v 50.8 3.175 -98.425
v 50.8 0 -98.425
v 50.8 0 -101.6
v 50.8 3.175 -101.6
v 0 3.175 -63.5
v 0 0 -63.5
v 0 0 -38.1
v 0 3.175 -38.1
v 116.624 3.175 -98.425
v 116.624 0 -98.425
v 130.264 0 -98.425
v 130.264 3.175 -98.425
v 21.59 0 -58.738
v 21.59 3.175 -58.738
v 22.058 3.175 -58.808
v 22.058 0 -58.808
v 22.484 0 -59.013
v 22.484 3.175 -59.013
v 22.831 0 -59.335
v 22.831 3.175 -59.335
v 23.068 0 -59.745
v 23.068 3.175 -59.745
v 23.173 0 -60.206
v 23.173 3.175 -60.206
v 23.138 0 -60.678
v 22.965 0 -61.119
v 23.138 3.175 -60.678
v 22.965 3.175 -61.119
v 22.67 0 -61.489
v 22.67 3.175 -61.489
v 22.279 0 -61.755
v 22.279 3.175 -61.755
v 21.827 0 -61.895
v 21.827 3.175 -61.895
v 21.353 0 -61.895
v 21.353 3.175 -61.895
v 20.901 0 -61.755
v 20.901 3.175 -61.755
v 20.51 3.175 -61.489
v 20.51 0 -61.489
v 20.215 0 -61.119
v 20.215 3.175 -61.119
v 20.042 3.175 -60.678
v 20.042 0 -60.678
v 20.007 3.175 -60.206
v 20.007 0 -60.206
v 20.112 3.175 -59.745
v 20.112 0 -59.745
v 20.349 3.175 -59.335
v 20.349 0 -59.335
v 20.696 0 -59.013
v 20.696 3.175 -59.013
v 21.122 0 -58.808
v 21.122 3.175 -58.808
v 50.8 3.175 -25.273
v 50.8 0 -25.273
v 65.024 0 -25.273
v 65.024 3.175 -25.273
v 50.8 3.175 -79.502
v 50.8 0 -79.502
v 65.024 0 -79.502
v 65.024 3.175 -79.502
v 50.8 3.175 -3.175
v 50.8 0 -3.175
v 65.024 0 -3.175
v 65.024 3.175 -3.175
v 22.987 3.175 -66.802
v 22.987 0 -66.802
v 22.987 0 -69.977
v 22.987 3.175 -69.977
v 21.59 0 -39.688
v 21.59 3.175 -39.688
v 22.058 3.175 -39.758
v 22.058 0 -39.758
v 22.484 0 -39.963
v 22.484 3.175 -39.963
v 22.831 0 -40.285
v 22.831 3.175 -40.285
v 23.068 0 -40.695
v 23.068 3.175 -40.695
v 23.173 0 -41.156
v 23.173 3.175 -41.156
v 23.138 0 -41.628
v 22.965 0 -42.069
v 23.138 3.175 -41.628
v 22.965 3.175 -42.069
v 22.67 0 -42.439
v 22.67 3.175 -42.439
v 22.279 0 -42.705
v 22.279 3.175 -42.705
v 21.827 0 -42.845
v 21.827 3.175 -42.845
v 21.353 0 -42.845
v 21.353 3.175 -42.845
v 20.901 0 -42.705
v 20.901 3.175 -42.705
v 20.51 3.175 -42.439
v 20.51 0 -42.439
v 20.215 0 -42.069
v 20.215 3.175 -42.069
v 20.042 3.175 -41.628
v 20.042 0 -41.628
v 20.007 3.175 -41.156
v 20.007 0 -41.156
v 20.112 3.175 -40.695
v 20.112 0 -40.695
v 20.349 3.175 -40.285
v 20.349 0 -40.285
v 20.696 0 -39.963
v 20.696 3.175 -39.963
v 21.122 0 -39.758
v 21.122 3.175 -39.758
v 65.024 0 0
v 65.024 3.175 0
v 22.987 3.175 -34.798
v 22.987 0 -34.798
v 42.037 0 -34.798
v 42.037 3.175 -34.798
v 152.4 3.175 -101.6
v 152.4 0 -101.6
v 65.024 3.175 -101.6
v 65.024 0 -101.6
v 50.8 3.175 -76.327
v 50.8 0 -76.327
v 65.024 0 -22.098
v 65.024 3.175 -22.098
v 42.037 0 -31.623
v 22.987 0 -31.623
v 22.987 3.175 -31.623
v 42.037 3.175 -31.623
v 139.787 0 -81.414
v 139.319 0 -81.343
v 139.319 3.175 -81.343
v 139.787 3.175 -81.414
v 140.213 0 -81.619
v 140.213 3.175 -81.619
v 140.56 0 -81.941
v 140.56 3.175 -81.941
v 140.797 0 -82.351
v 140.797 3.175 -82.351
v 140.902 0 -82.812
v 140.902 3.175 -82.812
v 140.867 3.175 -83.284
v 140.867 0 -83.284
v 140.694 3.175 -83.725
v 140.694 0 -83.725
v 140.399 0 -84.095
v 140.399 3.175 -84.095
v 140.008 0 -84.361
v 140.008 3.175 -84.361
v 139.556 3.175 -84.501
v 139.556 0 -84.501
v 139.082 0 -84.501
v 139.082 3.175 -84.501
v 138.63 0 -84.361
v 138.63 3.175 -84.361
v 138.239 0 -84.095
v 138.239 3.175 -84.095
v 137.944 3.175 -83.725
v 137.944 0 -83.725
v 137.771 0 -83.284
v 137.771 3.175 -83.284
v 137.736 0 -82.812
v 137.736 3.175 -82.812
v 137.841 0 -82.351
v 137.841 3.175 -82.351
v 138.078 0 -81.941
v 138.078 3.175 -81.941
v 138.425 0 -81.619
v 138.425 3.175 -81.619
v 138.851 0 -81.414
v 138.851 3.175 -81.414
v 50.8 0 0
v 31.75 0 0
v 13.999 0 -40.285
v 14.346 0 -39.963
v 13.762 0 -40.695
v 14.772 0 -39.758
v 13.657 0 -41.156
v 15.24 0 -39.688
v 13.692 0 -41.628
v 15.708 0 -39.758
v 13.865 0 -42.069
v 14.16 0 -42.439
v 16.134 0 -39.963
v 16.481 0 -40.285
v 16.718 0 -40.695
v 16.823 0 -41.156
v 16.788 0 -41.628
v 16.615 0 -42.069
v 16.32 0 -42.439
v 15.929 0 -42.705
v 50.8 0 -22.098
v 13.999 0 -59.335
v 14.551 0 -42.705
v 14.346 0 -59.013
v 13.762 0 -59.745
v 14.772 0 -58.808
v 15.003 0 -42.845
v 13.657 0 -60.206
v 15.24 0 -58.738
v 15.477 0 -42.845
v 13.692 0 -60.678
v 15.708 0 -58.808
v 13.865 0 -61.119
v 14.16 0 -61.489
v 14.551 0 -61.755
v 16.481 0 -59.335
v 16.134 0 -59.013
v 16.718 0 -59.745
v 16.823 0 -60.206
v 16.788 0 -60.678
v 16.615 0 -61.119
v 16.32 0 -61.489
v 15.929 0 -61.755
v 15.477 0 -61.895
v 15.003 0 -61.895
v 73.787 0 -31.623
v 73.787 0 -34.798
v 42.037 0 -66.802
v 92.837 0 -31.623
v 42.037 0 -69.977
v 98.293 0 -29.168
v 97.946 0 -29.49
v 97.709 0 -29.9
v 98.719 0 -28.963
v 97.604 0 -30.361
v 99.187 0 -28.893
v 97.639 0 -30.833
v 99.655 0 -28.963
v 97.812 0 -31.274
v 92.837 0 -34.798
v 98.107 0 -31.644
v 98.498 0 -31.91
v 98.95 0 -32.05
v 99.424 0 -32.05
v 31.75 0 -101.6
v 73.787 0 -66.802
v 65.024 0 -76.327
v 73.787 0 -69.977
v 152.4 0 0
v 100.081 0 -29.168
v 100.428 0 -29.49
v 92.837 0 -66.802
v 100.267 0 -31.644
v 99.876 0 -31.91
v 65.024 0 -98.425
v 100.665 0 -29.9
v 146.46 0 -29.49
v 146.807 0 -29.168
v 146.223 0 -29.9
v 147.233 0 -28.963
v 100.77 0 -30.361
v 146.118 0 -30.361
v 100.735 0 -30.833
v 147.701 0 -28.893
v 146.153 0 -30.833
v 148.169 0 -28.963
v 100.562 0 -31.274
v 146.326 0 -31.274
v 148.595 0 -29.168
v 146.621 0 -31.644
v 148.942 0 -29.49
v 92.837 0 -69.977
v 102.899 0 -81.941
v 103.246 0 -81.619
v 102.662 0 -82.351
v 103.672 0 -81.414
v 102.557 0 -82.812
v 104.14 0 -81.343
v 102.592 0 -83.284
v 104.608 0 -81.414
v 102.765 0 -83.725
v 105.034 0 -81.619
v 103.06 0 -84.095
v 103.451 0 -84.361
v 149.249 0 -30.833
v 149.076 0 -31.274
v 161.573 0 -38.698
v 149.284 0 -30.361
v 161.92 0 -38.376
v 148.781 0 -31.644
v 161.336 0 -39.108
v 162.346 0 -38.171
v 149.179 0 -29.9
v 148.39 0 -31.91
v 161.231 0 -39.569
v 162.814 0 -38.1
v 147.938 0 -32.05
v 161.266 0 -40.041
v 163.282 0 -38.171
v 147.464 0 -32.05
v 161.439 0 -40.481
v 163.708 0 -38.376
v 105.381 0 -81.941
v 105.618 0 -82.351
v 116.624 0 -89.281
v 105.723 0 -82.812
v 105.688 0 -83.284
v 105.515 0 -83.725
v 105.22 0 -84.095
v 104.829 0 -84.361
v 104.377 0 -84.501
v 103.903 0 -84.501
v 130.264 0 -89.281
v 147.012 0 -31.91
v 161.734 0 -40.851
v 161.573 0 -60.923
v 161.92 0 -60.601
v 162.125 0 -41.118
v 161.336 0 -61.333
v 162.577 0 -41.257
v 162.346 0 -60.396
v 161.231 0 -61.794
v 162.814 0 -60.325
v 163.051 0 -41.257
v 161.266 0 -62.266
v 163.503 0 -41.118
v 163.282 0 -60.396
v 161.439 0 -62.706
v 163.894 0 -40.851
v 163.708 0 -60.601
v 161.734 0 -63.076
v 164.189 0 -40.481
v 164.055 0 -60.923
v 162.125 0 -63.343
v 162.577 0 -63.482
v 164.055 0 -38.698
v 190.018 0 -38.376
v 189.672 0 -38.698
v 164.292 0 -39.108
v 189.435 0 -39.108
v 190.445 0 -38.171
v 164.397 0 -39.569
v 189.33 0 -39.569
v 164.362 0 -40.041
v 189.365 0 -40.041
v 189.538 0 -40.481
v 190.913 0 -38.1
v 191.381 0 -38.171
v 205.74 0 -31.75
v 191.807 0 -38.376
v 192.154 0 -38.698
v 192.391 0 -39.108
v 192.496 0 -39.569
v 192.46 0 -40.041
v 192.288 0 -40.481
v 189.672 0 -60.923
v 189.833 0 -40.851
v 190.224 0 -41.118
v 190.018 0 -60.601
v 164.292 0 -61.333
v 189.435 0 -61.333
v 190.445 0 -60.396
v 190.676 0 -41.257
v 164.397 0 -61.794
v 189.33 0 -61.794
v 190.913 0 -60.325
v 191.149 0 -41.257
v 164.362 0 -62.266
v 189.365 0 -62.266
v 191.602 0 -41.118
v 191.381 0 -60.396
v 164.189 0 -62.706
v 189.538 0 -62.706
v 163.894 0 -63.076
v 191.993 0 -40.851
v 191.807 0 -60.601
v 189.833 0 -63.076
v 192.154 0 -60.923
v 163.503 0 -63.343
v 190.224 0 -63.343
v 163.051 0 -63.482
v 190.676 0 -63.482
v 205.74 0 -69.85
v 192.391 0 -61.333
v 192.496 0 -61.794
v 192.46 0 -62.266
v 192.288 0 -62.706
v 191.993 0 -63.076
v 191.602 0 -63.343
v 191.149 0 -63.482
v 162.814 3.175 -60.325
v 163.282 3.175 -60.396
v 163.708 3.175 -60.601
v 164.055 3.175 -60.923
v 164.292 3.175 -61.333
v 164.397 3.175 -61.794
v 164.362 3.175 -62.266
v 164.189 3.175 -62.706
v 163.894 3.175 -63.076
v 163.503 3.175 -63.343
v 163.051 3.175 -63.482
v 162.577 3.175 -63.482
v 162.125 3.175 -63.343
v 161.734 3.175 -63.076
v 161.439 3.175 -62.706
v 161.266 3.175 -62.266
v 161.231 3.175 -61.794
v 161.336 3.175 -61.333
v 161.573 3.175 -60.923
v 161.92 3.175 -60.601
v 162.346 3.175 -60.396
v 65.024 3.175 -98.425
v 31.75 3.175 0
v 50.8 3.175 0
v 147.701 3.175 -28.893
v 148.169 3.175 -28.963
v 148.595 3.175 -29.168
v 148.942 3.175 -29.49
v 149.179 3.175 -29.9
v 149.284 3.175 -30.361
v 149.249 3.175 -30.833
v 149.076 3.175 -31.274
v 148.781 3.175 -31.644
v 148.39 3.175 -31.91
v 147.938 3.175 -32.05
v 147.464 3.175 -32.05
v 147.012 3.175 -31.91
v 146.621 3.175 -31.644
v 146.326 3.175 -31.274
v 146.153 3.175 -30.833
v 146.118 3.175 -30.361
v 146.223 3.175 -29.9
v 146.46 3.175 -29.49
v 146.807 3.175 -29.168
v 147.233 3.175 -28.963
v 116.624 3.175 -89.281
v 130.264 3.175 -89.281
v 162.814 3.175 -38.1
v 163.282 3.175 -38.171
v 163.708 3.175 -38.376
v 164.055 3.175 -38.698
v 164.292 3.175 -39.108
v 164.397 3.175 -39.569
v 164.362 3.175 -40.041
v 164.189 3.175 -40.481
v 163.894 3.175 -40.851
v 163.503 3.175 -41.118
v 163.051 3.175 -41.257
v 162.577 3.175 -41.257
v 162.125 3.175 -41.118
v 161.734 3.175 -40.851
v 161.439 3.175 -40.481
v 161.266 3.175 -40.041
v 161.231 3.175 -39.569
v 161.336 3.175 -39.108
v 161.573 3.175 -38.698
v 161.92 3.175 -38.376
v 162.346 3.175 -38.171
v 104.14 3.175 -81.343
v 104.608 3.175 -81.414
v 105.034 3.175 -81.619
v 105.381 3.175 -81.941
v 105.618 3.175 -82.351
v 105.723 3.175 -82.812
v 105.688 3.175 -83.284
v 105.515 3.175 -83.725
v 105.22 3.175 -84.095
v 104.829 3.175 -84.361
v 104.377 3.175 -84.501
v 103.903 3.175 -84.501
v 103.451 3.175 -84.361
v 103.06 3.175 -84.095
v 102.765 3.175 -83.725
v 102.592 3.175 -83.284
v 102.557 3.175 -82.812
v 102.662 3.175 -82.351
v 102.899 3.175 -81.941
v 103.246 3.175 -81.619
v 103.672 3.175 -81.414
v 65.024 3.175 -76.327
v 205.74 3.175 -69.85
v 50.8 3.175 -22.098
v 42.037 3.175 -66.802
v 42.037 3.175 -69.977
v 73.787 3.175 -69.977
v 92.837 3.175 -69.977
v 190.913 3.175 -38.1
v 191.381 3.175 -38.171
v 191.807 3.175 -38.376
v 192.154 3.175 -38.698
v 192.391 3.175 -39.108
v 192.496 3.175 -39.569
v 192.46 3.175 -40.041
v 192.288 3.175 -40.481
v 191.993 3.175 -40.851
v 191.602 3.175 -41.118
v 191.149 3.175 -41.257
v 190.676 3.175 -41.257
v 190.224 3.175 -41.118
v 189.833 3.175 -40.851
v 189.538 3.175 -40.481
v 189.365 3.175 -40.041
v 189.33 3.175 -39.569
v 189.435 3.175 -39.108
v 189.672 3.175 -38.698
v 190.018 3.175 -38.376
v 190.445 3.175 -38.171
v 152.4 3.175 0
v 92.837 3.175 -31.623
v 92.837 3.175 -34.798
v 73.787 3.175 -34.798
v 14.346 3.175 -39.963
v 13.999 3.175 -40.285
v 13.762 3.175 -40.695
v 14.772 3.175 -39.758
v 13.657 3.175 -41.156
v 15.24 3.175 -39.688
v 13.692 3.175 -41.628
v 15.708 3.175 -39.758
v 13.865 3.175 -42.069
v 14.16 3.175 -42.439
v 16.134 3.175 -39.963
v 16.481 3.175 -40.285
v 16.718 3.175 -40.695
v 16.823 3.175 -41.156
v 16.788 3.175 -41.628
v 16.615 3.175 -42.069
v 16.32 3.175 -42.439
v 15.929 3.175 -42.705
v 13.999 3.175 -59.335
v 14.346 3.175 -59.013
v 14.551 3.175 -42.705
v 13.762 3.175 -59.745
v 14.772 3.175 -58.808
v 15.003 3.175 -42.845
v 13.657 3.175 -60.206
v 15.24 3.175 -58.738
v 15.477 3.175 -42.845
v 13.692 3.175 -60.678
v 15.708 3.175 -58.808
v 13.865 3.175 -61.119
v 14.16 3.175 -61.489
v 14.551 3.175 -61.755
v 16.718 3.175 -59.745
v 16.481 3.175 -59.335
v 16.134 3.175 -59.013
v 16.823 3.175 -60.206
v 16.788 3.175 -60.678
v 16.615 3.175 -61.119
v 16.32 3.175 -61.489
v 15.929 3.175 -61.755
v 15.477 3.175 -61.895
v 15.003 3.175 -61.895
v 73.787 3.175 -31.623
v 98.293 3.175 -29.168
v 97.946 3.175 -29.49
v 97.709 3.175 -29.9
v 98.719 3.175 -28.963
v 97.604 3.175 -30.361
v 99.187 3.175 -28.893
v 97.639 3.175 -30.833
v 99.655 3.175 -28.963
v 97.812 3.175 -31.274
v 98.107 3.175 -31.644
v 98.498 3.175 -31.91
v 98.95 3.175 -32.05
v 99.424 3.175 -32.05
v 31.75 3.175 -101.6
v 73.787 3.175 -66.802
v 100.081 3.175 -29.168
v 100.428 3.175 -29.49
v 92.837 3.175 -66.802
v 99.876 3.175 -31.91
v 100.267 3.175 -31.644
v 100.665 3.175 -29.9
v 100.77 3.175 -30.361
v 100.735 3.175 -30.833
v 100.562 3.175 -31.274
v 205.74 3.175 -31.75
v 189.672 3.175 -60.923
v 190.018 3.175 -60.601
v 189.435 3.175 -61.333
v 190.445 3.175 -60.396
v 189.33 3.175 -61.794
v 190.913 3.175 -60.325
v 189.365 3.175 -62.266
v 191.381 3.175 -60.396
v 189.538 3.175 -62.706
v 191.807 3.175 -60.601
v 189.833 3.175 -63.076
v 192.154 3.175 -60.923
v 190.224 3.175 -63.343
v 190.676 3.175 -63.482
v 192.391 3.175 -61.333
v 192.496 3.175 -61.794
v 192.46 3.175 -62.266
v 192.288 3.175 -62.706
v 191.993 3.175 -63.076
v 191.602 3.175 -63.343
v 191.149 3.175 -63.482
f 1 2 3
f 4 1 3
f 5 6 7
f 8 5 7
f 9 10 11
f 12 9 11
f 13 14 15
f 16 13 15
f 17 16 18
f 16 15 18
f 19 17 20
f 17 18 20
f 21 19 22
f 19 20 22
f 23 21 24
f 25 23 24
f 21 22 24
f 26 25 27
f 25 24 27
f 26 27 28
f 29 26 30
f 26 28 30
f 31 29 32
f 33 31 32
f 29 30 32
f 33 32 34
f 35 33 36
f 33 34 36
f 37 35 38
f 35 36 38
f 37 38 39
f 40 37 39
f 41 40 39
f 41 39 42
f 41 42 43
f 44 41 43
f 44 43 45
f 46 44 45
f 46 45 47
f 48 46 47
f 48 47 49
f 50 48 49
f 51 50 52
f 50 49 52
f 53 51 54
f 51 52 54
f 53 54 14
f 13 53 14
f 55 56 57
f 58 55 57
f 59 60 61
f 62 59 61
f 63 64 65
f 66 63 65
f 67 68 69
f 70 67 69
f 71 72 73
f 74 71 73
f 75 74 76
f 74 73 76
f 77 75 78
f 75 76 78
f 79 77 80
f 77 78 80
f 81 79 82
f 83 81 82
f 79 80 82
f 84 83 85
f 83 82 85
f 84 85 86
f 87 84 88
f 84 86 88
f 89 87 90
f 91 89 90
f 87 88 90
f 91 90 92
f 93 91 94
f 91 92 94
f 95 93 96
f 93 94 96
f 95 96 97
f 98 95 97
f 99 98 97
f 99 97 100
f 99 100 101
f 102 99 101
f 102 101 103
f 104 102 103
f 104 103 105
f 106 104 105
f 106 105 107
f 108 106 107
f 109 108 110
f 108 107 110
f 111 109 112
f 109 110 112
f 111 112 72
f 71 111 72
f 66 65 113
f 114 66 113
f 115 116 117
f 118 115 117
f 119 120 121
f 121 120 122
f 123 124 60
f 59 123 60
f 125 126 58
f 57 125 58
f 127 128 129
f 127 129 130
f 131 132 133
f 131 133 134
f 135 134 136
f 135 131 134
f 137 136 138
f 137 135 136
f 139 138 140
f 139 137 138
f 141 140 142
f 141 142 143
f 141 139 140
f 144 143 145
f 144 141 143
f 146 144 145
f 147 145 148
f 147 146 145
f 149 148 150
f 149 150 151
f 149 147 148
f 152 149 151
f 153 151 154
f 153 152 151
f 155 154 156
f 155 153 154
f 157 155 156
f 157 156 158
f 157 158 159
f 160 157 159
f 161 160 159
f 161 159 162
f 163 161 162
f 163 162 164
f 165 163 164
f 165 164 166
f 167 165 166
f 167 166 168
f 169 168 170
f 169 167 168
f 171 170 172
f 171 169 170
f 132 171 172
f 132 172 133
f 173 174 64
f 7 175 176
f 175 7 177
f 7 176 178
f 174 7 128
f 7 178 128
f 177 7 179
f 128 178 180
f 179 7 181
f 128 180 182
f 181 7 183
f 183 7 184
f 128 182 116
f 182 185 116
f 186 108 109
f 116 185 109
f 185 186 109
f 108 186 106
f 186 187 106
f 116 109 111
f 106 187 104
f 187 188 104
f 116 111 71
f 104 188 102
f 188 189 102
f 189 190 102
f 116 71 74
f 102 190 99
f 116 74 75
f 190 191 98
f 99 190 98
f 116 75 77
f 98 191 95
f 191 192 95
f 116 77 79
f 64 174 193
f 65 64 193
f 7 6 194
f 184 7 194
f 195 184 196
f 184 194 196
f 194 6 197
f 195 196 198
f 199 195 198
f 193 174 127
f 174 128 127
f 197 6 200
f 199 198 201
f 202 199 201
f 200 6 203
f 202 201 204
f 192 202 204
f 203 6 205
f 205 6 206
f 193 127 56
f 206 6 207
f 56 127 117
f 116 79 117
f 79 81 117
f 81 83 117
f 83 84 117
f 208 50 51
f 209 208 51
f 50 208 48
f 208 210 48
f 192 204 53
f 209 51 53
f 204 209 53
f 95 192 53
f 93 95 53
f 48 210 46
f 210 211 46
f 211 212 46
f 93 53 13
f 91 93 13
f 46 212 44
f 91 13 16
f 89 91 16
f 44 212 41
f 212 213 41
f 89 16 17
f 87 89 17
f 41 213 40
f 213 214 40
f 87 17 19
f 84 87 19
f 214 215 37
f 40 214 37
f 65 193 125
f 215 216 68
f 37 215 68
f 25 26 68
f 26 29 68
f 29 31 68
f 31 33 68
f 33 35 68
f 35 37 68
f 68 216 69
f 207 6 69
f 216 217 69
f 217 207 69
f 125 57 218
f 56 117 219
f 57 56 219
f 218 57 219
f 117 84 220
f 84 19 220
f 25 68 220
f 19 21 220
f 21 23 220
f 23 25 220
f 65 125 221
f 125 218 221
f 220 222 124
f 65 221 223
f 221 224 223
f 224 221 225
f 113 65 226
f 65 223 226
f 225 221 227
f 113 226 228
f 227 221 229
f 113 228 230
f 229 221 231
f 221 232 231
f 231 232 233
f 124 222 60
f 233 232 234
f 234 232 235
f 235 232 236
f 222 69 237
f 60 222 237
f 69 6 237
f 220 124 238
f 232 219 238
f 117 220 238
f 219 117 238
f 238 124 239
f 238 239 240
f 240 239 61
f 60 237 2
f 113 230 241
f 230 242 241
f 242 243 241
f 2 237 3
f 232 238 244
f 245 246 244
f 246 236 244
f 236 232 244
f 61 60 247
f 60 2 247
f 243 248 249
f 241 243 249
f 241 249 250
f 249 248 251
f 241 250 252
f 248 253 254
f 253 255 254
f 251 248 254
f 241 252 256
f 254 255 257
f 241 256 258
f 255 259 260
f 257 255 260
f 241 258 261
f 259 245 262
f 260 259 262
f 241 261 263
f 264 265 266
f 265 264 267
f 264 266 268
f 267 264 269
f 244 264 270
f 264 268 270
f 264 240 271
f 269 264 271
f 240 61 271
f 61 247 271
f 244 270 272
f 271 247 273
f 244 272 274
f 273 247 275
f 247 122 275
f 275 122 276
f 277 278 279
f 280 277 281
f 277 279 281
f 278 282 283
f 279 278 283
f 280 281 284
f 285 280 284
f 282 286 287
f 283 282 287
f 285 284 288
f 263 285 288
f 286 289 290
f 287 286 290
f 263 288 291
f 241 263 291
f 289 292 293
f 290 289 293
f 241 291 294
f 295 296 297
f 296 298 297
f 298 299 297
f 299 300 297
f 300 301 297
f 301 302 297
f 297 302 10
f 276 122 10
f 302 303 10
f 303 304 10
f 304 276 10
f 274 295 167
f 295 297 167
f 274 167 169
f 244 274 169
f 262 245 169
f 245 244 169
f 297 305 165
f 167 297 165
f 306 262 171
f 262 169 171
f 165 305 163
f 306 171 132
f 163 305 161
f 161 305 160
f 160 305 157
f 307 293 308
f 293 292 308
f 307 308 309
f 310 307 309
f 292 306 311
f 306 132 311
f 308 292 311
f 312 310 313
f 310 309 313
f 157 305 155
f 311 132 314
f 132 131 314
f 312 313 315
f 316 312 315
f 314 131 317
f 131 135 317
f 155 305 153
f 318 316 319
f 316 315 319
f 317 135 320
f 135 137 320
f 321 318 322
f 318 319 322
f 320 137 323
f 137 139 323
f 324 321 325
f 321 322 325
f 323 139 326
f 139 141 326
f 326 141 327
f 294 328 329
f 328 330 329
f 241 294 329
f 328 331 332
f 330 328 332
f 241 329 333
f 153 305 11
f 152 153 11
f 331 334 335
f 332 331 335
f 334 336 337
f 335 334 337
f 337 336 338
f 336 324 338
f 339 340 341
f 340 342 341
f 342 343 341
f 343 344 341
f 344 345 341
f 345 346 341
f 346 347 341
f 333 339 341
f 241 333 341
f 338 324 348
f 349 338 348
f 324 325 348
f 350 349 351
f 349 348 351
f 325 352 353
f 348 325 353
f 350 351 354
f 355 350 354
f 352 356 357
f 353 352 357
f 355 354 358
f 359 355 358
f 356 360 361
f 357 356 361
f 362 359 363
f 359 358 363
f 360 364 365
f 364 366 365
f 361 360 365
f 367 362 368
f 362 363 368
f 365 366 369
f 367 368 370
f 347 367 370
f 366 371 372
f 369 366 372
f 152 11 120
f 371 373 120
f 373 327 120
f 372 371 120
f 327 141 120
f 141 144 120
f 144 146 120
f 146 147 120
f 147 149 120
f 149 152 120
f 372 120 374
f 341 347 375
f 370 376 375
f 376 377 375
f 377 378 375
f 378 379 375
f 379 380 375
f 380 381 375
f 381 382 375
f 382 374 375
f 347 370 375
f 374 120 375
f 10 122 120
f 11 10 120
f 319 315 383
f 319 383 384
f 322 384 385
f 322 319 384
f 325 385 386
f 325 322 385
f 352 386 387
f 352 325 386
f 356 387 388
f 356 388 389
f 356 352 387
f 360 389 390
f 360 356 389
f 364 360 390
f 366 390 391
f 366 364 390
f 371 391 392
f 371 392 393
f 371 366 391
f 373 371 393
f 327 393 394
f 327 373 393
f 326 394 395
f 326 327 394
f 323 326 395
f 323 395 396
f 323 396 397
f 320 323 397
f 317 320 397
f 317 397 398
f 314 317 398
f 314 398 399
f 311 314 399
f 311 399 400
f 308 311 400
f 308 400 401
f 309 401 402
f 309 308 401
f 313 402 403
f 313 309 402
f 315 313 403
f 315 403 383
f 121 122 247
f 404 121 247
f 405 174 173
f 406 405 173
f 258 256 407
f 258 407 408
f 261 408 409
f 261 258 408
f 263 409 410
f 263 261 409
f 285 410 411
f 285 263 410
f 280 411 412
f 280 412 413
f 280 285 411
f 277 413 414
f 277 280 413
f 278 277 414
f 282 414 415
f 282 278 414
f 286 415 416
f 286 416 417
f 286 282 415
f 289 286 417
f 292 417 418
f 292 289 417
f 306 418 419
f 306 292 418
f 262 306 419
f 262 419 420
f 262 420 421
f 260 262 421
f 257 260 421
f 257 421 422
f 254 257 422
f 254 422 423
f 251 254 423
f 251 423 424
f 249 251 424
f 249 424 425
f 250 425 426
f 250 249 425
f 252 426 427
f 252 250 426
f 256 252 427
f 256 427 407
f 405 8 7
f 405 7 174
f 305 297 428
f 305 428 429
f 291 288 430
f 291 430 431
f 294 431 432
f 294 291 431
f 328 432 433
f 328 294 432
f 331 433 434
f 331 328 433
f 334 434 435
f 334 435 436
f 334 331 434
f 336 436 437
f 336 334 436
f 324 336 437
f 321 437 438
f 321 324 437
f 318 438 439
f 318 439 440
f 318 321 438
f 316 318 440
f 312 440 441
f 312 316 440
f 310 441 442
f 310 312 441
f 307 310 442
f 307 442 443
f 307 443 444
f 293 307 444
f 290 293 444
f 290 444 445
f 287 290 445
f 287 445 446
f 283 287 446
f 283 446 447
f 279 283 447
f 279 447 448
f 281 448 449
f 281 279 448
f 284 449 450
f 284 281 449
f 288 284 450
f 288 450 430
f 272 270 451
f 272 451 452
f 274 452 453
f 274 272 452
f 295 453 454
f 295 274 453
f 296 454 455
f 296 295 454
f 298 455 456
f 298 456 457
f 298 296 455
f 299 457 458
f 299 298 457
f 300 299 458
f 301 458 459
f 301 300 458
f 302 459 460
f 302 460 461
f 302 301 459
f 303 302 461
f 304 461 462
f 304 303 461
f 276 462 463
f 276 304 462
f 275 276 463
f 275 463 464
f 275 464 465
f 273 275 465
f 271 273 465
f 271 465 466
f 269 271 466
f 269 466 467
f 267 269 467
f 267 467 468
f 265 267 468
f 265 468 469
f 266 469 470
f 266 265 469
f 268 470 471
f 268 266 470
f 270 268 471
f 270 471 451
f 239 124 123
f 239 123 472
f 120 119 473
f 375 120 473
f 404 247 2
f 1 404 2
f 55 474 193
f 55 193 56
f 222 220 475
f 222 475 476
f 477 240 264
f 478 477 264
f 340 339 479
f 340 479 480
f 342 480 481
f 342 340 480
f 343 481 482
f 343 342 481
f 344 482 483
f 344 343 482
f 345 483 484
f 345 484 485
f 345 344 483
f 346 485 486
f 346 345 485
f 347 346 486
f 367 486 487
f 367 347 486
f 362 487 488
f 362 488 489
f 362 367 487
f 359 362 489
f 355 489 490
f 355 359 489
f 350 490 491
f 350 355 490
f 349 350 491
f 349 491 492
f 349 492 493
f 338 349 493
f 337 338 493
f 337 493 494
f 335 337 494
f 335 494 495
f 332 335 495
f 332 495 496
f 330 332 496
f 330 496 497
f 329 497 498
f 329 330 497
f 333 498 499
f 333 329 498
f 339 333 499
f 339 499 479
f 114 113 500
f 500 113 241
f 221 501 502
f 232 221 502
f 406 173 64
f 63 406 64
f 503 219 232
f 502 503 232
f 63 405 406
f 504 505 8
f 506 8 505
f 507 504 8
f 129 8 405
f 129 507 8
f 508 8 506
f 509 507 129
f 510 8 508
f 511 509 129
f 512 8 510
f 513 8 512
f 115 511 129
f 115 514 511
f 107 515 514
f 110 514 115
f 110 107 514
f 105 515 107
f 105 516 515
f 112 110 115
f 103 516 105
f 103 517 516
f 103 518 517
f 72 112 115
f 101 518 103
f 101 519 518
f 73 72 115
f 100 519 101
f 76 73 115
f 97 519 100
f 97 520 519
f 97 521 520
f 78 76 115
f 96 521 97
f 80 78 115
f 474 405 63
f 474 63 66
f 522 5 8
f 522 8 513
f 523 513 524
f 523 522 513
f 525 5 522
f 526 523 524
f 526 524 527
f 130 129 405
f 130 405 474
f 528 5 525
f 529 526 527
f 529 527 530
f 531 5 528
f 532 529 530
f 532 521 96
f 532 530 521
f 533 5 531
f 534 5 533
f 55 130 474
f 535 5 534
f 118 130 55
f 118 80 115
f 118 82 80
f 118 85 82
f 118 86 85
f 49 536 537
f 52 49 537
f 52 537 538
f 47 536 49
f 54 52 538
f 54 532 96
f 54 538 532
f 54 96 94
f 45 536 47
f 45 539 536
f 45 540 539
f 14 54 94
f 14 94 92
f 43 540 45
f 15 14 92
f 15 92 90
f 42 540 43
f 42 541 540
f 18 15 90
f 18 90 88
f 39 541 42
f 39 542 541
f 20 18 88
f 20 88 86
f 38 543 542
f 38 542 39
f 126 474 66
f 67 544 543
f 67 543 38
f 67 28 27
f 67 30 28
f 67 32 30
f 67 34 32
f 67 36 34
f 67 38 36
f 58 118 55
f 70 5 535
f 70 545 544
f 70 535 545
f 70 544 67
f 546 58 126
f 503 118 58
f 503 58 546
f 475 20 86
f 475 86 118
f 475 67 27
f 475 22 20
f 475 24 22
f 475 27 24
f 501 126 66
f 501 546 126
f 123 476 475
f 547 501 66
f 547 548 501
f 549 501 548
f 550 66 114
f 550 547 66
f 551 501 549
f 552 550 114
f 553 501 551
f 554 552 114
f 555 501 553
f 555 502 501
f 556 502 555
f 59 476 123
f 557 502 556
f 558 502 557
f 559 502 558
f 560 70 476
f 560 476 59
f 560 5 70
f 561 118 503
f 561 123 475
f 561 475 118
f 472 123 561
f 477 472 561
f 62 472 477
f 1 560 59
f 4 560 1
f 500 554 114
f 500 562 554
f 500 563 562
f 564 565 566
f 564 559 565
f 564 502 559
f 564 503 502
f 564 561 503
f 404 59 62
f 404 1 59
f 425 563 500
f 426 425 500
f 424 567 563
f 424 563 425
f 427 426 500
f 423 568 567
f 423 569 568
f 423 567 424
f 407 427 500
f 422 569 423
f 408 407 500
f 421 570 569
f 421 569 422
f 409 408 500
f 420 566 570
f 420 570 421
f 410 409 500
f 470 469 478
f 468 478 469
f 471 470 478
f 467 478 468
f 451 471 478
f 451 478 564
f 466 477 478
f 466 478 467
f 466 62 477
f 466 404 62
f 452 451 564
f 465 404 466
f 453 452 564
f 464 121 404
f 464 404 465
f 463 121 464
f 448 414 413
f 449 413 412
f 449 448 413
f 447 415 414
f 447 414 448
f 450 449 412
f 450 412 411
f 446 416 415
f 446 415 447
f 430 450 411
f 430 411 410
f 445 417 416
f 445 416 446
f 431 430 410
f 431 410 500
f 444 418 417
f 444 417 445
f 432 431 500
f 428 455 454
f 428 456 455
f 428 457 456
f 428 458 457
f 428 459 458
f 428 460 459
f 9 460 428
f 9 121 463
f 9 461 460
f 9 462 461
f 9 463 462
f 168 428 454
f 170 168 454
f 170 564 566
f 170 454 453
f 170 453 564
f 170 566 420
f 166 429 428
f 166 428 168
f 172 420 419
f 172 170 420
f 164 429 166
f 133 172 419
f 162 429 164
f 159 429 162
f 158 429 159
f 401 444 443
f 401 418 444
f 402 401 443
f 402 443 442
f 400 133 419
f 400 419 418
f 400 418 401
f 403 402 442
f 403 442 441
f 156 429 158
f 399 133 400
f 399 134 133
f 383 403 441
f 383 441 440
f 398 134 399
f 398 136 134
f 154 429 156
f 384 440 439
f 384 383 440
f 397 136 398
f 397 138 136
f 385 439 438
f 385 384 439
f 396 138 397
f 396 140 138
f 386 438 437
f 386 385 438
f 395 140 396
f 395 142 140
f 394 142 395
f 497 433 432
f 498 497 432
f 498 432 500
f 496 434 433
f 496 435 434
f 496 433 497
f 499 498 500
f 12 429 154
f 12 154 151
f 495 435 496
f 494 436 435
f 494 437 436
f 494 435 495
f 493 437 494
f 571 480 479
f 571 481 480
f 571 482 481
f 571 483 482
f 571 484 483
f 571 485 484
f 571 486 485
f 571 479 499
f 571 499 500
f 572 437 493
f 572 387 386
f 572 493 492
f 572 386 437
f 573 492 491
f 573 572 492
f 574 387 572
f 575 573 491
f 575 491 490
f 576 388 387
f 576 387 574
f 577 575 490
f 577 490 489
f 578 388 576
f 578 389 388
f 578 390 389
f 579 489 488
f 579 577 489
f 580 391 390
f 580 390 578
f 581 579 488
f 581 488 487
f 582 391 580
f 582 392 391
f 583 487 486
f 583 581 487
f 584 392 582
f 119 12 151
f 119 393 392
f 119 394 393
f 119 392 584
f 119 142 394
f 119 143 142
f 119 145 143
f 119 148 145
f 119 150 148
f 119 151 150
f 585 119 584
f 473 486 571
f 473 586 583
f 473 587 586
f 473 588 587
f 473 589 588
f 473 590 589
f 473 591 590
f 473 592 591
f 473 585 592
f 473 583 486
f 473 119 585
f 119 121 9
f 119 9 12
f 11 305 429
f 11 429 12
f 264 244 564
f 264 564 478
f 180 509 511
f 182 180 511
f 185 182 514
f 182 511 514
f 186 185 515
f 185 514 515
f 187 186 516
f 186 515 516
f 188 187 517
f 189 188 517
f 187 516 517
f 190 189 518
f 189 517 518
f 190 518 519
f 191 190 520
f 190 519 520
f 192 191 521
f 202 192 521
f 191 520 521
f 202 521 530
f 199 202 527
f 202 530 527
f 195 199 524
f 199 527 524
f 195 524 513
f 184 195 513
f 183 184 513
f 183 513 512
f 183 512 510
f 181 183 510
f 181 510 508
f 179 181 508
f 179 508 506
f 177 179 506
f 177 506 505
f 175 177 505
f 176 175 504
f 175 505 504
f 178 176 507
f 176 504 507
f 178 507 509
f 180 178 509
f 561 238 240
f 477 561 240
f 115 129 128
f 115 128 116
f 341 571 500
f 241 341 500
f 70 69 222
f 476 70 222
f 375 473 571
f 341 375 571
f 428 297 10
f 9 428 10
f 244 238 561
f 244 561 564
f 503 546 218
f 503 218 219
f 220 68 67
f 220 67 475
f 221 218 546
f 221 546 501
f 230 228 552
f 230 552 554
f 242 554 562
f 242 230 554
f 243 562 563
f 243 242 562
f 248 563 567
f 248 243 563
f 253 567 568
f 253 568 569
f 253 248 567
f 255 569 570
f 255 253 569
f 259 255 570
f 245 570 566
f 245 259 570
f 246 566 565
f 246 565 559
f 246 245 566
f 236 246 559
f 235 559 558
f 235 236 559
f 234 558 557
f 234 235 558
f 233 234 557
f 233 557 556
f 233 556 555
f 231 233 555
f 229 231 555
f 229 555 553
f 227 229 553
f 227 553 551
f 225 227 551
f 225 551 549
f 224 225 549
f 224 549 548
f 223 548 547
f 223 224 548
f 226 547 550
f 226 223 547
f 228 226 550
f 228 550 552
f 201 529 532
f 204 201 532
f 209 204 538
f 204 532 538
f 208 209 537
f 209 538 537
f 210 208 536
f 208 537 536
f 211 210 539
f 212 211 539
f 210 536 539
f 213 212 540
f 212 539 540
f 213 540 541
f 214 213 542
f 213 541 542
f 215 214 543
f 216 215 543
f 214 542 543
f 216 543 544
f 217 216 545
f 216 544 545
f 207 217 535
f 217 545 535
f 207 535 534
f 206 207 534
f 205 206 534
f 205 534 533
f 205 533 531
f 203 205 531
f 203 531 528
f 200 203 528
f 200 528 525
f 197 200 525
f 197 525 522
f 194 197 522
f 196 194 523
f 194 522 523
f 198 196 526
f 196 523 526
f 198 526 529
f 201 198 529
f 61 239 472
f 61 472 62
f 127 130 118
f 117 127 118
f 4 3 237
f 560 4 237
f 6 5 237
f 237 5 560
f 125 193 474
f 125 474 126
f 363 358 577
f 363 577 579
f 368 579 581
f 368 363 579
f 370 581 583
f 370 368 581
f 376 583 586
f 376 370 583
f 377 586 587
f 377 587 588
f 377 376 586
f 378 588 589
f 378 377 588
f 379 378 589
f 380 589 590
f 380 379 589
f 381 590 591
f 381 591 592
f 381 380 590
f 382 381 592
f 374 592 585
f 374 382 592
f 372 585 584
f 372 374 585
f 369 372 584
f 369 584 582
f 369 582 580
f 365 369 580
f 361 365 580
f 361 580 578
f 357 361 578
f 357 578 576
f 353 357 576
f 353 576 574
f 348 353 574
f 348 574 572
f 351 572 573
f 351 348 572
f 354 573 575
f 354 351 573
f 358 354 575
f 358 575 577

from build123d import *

# Parameters (mm, degrees)
SKETCH1_W           = 14.224
SKETCH1_H           = 3.175
SKETCH1_W_2         = 19.05
SKETCH1_R           = 1.5875
SKETCH1_W_3         = 13.6398
SKETCH1_H_2         = 9.144
BOSS_EXTRUDE1_DEPTH = 3.175
SKETCH2_R           = 1.5875
CUT_EXTRUDE1_DEPTH  = 3.175
CUT_EXTRUDE2_DEPTH  = 251.18113563


with BuildPart() as part:
    # Sketch1 → Boss-Extrude1 (new body)
    with BuildSketch(Plane(origin=(0, 0, 0), x_dir=(1, 0, 0), z_dir=(0, 1, 0))):
        Polygon((0, 101.6), (0, 0), (50.8, 0), (50.8, 3.175), (65.024, 3.175), (65.024, 0), (228.6, 0), (228.6, 101.6), (65.024, 101.6), (65.024, 98.425), (50.8, 98.425), (50.8, 101.6), align=None)
        with Locations((57.912, 23.6855)):
            Rectangle(SKETCH1_W, SKETCH1_H, mode=Mode.SUBTRACT)
        with Locations((32.512, 33.2105)):
            Rectangle(SKETCH1_W_2, SKETCH1_H, mode=Mode.SUBTRACT)
        with Locations((83.312, 33.2105)):
            Rectangle(SKETCH1_W_2, SKETCH1_H, mode=Mode.SUBTRACT)
        with Locations(Location((99.187, 30.48, 0), (0, 0, 270))):
            Circle(SKETCH1_R, mode=Mode.SUBTRACT)
        with Locations(Location((147.701, 30.48, 0), (0, 0, 270))):
            Circle(SKETCH1_R, mode=Mode.SUBTRACT)
        with Locations(Location((162.814, 39.6875, 0), (0, 0, 270))):
            Circle(SKETCH1_R, mode=Mode.SUBTRACT)
        with Locations(Location((190.91275, 39.6875, 0), (0, 0, 270))):
            Circle(SKETCH1_R, mode=Mode.SUBTRACT)
        with Locations((32.512, 68.3895)):
            Rectangle(SKETCH1_W_2, SKETCH1_H, mode=Mode.SUBTRACT)
        with Locations((83.312, 68.3895)):
            Rectangle(SKETCH1_W_2, SKETCH1_H, mode=Mode.SUBTRACT)
        with Locations((57.912, 77.9145)):
            Rectangle(SKETCH1_W, SKETCH1_H, mode=Mode.SUBTRACT)
        with Locations(Location((104.14, 82.931, 0), (0, 0, 270))):
            Circle(SKETCH1_R, mode=Mode.SUBTRACT)
        with Locations(Location((162.814, 61.9125, 0), (0, 0, 270))):
            Circle(SKETCH1_R, mode=Mode.SUBTRACT)
        with Locations(Location((190.91275, 61.9125, 0), (0, 0, 270))):
            Circle(SKETCH1_R, mode=Mode.SUBTRACT)
        with Locations(Location((139.319, 82.931, 0), (0, 0, 270))):
            Circle(SKETCH1_R, mode=Mode.SUBTRACT)
        with Locations((123.444, 93.853)):
            Rectangle(SKETCH1_W_3, SKETCH1_H_2, mode=Mode.SUBTRACT)
    extrude(amount=BOSS_EXTRUDE1_DEPTH)

    # Sketch2 → Cut-Extrude1 (cut)
    with BuildSketch(Plane(origin=(0, 3.175, 0), x_dir=(1, 0, 0), z_dir=(0, 1, 0))):
        with Locations(Location((15.24, 60.325, 0), (0, 0, 270))):
            Circle(SKETCH2_R)
        with Locations(Location((15.24, 41.275, 0), (0, 0, 270))):
            Circle(SKETCH2_R)
        with Locations(Location((21.59, 41.275, 0), (0, 0, 270))):
            Circle(SKETCH2_R)
        with Locations(Location((21.59, 60.325, 0), (0, 0, 270))):
            Circle(SKETCH2_R)
    extrude(amount=-CUT_EXTRUDE1_DEPTH, mode=Mode.SUBTRACT)

    # Sketch3 → Cut-Extrude2 (cut, through all)
    with BuildSketch(Plane(origin=(0, 3.175, 0), x_dir=(1, 0, 0), z_dir=(0, 1, 0))):
        Polygon((0, 63.5), (31.75, 101.6), (0, 101.6), align=None)
        Polygon((152.4, 101.6), (205.74, 69.85), (205.74, 31.75), (152.4, 0), (228.6, 0), (228.6, 44.45), (228.6, 57.15), (228.6, 101.6), align=None)
        Polygon((31.75, 0), (0, 0), (0, 38.1), align=None)
    extrude(amount=-CUT_EXTRUDE2_DEPTH, mode=Mode.SUBTRACT)


solid = part.part
